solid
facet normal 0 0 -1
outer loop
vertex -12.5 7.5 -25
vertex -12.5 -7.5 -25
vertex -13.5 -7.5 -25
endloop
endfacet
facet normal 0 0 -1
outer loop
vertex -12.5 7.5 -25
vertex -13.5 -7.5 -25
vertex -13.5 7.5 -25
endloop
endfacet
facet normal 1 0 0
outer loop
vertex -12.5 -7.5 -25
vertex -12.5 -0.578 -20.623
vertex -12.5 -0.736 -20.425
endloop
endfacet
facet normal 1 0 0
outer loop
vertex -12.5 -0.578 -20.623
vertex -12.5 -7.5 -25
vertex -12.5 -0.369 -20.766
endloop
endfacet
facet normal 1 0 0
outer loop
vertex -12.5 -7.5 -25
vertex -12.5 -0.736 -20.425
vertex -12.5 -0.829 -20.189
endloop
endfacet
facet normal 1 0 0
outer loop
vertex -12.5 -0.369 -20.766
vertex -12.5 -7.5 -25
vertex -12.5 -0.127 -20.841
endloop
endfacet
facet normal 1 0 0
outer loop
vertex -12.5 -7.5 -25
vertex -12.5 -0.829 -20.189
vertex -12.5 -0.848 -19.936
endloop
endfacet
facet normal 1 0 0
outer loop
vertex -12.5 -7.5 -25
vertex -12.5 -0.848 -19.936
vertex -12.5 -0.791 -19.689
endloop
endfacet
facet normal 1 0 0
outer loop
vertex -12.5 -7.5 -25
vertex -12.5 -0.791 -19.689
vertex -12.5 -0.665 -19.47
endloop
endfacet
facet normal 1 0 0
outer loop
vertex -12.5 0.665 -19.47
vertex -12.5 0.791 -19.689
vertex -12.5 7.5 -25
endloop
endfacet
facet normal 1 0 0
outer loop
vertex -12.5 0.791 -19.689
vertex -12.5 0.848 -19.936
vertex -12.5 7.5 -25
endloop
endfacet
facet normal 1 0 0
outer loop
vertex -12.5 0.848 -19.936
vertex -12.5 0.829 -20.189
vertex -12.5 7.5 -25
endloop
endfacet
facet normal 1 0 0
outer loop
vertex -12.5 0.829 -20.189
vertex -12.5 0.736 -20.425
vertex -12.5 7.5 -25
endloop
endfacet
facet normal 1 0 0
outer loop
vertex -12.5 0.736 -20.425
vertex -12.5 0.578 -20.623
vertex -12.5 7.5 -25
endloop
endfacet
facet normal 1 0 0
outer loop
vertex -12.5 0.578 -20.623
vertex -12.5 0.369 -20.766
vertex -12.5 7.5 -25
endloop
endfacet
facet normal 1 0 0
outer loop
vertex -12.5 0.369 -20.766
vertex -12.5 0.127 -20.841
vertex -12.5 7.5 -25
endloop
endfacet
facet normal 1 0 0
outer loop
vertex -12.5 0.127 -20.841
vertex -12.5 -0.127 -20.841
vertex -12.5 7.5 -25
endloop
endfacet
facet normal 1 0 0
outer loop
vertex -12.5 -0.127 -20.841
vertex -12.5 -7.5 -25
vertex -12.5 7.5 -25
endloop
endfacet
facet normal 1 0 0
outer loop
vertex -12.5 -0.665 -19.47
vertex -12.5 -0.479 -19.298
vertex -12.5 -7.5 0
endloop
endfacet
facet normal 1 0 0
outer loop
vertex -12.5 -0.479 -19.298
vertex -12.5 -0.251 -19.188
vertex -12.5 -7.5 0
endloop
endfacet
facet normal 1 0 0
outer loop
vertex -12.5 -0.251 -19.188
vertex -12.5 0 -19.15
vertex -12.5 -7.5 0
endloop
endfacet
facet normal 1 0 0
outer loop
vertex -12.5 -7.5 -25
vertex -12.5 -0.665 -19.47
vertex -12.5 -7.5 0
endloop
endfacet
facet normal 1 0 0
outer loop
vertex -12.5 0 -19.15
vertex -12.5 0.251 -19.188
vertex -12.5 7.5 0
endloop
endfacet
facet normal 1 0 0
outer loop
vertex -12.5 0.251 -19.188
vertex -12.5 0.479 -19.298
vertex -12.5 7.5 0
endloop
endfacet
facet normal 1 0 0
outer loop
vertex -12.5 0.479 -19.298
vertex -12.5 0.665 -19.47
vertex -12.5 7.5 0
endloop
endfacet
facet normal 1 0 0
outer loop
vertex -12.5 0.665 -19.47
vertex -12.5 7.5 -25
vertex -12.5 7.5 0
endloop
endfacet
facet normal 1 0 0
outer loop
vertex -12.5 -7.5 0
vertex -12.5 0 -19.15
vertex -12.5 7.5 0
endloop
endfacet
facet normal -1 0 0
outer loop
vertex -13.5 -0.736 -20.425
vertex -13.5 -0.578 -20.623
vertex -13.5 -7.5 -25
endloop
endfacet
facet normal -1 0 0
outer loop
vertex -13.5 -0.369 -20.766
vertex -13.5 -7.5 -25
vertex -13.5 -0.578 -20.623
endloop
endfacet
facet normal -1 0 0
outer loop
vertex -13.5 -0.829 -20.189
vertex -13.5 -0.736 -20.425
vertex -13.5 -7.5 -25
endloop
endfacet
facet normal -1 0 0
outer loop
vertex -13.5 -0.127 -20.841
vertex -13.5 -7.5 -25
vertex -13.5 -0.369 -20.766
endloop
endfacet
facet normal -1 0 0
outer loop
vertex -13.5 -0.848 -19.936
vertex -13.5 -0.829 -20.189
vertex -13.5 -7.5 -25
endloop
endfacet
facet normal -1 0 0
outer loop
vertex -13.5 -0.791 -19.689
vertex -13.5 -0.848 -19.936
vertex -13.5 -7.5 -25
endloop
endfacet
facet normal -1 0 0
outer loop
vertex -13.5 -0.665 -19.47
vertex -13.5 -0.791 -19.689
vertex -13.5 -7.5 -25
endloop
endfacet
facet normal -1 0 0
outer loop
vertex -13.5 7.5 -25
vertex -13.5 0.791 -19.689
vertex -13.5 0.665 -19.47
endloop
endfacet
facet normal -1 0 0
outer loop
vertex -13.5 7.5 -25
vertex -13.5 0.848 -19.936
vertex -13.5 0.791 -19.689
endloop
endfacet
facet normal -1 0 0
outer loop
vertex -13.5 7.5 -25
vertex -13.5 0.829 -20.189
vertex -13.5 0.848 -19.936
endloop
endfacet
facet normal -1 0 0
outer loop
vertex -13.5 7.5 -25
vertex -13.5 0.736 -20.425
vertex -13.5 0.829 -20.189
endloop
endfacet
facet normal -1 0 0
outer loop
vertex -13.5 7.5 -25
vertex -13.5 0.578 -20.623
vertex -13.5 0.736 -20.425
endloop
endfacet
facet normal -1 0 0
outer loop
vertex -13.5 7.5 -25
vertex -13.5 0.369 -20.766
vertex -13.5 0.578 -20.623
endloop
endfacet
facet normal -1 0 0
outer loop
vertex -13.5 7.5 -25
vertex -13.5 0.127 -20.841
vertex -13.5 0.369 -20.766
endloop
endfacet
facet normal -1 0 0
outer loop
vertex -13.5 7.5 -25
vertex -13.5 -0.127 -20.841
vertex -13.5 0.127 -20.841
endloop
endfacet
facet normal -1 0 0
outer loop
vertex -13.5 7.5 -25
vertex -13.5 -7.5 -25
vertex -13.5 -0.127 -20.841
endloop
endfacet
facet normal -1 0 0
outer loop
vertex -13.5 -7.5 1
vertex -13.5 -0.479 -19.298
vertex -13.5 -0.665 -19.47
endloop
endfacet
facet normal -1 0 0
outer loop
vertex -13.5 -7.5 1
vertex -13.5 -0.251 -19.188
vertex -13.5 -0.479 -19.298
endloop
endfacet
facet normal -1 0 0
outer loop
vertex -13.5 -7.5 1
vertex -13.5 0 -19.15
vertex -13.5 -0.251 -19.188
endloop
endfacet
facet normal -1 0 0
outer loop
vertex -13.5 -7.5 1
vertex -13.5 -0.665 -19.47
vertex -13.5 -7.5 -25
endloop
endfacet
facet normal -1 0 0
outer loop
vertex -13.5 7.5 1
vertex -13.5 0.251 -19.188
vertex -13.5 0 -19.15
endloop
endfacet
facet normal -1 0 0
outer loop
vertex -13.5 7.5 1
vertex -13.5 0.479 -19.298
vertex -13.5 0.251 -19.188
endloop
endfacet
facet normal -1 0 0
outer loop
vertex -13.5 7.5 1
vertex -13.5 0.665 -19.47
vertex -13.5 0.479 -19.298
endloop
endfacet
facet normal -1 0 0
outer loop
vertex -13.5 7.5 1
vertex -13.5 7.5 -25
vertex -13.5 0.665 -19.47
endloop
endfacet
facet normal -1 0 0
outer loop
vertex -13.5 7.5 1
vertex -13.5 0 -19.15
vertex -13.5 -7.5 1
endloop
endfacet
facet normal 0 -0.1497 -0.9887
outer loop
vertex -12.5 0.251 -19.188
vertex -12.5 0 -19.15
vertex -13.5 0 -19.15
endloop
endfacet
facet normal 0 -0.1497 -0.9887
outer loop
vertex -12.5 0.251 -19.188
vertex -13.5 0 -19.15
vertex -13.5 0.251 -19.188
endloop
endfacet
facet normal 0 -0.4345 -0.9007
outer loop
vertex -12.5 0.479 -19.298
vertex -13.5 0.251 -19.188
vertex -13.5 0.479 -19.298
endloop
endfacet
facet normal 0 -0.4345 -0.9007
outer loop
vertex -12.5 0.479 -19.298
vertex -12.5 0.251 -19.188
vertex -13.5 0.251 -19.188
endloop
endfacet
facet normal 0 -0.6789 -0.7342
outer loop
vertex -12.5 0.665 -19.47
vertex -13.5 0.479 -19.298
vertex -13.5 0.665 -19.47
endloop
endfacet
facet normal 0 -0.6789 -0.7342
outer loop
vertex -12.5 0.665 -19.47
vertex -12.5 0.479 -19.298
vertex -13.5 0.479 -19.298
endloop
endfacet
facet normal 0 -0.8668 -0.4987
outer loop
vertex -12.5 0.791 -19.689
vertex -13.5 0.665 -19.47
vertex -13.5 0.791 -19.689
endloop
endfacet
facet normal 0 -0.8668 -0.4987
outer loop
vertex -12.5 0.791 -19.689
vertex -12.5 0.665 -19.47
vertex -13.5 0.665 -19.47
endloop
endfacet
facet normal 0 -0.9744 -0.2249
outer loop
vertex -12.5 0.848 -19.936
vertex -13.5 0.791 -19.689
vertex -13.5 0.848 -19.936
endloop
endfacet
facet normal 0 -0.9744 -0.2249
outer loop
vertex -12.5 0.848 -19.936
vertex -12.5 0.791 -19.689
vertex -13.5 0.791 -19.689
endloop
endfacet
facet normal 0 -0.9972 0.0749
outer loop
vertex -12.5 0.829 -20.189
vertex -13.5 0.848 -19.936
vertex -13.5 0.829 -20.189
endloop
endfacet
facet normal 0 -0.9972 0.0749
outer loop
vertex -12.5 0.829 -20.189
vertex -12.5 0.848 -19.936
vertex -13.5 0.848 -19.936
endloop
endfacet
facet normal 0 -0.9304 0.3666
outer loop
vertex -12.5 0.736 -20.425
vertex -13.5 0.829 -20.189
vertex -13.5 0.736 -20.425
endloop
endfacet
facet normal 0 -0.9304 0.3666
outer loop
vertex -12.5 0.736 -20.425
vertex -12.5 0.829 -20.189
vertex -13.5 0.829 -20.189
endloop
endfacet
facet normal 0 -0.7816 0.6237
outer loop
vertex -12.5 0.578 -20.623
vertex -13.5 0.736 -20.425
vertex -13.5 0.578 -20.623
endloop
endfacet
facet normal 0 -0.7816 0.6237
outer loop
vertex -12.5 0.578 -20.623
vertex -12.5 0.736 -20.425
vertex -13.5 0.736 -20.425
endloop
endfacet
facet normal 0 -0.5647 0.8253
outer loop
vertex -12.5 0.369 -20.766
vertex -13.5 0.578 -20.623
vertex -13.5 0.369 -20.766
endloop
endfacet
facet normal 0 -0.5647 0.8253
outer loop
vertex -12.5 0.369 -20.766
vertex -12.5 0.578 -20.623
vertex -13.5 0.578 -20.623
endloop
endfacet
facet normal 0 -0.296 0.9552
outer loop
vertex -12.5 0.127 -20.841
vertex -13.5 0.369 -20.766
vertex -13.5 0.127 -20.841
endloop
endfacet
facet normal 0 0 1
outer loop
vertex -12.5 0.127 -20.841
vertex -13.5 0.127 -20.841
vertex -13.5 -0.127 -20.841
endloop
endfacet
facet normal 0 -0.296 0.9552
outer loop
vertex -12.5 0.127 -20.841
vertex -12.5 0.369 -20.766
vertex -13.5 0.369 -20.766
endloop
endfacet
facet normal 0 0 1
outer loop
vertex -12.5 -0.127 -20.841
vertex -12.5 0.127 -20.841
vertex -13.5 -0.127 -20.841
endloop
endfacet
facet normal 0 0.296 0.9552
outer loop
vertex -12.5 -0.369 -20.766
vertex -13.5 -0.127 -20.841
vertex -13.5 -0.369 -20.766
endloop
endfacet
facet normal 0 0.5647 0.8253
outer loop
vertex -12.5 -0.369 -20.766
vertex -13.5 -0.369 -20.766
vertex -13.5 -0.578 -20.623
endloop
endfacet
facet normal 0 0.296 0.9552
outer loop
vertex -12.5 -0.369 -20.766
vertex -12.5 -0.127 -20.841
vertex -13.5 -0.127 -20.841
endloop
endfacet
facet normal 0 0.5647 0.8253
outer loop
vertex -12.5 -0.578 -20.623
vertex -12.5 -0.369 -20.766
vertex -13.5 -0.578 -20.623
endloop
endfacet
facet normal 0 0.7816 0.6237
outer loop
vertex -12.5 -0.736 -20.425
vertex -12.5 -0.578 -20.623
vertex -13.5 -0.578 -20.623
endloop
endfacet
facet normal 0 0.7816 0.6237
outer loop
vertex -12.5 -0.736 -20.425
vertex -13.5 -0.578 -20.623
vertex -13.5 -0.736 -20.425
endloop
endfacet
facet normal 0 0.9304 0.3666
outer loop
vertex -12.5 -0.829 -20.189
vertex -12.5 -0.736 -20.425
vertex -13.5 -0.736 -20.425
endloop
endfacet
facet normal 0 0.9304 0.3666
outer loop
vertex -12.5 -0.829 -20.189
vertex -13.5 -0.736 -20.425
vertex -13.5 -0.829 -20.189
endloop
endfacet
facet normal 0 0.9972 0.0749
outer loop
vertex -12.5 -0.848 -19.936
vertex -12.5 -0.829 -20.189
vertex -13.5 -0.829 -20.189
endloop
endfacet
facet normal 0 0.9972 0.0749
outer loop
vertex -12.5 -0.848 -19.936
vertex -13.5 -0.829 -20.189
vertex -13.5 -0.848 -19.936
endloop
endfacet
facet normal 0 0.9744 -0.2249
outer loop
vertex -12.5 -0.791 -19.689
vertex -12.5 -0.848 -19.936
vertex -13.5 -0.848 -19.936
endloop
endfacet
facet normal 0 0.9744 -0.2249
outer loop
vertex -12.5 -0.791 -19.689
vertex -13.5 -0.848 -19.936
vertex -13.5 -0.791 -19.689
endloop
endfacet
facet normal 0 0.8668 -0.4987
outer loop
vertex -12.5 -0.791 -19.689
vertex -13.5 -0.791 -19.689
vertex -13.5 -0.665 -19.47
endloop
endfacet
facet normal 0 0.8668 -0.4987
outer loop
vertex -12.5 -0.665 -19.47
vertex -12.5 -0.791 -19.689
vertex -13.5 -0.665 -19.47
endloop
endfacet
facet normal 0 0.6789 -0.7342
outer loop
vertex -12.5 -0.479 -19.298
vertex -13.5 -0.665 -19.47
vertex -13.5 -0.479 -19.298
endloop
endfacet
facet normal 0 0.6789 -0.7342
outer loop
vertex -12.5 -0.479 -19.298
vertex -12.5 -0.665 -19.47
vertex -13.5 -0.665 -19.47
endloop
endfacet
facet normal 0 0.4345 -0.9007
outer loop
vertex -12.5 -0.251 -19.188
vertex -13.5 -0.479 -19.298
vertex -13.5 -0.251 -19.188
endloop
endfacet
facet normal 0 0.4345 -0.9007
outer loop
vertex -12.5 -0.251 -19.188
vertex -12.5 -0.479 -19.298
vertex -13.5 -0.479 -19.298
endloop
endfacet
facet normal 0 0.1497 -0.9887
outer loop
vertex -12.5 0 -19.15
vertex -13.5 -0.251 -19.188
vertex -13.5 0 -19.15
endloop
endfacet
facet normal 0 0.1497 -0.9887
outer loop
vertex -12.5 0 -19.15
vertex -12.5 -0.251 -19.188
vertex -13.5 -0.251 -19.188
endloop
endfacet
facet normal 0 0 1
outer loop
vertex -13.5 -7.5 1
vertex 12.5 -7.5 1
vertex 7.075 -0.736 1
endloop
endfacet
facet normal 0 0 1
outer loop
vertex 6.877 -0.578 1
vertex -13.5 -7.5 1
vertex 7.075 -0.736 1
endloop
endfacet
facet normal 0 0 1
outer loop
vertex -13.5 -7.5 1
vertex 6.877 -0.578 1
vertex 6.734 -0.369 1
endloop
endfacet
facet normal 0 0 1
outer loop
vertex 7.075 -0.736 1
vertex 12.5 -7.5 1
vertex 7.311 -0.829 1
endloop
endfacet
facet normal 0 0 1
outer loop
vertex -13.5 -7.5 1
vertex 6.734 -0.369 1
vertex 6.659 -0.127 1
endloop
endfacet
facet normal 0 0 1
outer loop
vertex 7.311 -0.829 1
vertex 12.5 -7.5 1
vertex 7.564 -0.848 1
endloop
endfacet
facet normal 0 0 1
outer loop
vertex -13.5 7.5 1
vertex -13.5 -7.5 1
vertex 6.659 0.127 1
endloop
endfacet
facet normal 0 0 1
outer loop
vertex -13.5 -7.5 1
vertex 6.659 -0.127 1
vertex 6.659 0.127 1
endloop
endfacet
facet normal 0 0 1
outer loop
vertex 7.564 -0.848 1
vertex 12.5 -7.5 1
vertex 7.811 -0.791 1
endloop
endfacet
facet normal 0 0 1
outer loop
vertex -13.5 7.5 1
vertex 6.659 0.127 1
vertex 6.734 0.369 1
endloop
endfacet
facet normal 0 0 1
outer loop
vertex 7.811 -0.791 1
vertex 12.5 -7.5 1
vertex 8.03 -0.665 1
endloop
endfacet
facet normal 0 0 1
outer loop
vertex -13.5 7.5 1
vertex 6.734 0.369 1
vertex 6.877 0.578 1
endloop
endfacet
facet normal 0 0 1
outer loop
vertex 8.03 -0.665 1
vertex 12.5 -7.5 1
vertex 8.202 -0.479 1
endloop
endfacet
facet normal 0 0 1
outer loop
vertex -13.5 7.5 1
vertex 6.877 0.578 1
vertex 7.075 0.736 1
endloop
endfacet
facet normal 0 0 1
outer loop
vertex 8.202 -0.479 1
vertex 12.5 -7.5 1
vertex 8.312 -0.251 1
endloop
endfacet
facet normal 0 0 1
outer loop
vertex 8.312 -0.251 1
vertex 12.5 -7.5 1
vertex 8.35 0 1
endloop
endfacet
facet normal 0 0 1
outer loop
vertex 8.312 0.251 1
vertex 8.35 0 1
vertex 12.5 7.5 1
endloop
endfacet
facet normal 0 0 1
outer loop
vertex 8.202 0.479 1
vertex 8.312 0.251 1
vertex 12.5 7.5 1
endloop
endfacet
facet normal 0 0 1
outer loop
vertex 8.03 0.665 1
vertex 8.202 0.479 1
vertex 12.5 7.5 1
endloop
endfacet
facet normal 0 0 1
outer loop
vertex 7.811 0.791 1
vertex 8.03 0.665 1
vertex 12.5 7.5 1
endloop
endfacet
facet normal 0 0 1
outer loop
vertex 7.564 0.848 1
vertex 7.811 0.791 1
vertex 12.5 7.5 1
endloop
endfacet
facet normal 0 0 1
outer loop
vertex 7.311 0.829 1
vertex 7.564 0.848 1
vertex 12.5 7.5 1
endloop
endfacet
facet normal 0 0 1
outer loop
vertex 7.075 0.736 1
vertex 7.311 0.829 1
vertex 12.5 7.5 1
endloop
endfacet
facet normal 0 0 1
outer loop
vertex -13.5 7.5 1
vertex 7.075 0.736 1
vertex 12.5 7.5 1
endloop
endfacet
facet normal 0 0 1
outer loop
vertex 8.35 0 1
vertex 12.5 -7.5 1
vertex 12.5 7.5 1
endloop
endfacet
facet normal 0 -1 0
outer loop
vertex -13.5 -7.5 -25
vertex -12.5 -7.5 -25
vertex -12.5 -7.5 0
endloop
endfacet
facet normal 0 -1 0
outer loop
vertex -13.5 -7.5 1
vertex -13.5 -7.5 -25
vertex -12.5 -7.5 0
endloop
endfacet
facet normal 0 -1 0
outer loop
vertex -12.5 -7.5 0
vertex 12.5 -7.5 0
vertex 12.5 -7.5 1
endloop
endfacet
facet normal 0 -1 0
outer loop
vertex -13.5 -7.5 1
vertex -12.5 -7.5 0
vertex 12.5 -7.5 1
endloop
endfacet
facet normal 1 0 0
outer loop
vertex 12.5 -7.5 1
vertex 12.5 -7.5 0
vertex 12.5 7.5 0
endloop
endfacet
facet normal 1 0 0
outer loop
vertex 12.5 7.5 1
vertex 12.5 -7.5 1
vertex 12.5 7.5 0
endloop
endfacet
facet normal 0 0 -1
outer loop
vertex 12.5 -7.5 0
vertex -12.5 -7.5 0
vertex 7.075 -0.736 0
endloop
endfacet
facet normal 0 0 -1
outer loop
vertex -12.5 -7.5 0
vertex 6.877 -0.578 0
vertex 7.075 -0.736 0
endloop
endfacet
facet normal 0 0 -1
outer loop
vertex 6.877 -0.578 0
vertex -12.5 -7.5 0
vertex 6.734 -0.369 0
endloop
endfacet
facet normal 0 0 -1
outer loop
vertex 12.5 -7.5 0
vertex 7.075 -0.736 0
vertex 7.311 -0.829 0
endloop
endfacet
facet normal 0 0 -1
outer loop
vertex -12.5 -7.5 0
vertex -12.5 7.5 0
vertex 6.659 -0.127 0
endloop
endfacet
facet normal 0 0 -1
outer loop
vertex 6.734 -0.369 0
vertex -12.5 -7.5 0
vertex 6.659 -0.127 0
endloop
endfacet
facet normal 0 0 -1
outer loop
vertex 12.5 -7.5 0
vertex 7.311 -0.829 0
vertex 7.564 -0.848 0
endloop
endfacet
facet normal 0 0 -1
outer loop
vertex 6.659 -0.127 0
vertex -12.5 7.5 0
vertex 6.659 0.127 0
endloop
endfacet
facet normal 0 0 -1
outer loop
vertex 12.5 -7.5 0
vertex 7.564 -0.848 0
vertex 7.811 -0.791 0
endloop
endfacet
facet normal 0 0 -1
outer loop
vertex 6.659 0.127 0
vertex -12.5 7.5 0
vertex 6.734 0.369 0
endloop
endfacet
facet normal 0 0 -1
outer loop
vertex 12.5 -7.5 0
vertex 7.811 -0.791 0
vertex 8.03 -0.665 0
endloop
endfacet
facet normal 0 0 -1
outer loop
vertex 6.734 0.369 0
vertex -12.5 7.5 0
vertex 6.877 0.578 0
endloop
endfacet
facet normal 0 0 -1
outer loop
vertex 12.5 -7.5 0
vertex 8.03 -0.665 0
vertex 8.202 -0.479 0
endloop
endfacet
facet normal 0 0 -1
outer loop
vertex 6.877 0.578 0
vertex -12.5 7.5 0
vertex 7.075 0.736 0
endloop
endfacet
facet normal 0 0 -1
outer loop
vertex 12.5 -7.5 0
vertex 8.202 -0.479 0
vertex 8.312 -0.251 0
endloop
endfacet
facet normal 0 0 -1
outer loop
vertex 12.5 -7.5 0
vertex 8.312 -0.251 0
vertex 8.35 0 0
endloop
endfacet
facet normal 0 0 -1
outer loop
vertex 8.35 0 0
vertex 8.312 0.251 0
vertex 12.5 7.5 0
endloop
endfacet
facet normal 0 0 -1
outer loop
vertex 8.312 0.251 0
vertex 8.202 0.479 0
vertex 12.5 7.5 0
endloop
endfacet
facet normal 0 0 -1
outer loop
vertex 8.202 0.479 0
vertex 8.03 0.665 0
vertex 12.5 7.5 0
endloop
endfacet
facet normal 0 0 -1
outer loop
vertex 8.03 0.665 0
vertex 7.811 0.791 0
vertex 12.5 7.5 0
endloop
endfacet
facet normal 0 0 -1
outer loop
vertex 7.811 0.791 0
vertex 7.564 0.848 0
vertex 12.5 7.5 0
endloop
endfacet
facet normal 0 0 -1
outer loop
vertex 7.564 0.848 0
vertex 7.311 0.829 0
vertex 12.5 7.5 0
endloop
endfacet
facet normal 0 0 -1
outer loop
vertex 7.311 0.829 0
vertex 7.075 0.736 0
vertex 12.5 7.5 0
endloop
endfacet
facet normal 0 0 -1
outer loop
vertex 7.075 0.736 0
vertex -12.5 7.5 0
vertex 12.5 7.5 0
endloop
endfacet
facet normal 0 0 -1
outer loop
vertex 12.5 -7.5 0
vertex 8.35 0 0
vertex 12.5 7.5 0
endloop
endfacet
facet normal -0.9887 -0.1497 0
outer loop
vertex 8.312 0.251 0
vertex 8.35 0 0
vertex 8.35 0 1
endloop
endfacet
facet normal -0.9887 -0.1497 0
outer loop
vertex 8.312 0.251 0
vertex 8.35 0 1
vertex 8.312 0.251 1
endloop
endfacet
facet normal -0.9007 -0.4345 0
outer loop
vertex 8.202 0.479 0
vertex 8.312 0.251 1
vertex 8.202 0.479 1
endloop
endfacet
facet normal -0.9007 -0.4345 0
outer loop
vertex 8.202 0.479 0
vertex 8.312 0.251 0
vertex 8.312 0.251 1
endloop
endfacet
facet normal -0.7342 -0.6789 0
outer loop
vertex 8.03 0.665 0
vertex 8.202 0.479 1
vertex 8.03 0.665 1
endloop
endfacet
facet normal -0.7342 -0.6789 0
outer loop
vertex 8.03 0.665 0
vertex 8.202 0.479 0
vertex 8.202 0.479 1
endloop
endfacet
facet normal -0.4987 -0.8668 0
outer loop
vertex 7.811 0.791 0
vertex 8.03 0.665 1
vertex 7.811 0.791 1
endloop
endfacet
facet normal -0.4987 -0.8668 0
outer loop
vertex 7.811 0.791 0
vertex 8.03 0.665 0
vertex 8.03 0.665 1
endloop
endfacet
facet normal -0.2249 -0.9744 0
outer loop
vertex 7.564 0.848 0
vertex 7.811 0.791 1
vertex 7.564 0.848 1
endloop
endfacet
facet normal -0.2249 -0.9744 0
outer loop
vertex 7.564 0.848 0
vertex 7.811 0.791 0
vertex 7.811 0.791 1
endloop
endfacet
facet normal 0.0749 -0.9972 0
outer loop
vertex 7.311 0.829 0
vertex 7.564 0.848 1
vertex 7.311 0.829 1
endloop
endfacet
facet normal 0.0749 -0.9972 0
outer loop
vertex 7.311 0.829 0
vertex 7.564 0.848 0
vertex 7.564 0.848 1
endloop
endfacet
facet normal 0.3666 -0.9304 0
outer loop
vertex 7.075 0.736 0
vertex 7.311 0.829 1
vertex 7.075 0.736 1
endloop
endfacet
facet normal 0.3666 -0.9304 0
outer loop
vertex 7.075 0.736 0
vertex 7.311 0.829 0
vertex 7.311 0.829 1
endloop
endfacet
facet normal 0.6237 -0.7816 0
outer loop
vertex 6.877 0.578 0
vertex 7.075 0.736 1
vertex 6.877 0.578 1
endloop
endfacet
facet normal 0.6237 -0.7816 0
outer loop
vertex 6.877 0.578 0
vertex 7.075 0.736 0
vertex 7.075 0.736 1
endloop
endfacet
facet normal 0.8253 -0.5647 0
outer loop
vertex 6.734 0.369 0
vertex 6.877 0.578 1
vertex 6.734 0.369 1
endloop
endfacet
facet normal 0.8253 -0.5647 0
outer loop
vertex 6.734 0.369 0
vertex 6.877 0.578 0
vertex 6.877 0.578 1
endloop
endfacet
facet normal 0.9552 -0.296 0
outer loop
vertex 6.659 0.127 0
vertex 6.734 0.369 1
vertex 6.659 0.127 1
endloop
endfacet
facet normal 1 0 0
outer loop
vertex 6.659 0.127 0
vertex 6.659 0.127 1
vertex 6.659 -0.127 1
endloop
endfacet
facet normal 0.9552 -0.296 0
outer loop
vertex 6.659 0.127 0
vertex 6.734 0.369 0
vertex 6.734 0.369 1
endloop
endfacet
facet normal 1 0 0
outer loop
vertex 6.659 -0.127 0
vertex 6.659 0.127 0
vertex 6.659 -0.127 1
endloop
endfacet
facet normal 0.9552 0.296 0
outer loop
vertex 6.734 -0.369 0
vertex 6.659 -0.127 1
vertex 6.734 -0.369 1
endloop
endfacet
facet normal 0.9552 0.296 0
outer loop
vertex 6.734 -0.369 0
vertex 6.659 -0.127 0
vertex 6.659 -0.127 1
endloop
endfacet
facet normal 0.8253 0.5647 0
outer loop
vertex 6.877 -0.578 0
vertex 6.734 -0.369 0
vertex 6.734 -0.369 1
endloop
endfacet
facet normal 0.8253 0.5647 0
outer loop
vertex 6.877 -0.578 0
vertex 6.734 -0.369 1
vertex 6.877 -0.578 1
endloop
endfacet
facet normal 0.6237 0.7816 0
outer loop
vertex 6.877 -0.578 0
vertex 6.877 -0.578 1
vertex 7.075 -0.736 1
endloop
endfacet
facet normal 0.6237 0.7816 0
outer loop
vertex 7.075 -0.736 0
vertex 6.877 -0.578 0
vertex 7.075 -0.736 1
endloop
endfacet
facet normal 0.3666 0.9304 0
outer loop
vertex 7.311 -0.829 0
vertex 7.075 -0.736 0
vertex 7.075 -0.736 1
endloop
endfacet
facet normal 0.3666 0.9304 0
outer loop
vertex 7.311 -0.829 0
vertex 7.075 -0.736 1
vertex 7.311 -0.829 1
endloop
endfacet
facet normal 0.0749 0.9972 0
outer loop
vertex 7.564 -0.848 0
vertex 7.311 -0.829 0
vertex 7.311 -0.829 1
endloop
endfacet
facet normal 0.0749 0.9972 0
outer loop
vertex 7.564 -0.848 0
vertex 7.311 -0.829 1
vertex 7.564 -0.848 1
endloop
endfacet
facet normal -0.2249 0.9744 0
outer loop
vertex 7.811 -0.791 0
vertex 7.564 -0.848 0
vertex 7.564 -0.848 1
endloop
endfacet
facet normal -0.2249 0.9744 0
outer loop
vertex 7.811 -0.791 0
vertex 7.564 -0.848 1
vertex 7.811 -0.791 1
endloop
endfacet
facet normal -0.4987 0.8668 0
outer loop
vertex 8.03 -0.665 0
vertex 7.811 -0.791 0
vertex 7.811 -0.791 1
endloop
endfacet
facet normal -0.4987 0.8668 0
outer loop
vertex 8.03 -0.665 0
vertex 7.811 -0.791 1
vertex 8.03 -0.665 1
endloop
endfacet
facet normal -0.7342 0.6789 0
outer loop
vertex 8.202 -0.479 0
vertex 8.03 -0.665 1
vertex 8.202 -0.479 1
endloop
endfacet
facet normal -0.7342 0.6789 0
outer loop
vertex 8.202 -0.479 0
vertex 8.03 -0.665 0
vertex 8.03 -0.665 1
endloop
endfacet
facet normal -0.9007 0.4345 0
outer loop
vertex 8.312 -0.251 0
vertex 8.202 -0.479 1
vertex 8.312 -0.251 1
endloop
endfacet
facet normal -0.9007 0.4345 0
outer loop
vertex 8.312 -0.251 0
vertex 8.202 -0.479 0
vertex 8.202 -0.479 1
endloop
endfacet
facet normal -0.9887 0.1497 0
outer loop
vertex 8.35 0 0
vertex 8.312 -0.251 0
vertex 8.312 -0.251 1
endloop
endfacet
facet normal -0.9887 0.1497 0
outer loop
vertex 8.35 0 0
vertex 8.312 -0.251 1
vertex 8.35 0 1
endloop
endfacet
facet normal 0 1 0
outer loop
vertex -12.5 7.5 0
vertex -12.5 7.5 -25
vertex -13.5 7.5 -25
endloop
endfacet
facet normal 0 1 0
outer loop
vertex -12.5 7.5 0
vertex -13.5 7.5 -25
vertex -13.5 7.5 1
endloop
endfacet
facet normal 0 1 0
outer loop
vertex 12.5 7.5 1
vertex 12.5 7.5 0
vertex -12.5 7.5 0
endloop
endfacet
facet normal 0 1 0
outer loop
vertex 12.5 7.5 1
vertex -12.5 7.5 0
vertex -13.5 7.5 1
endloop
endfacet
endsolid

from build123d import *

# Parameters (mm, degrees)
SKETCH1_W           = 25
SKETCH1_H           = 15
SKETCH1_R           = 0.85
BOSS_EXTRUDE1_DEPTH = 1
SKETCH2_W           = 26
SKETCH2_H           = 15
SKETCH2_R           = 0.85
BOSS_EXTRUDE2_DEPTH = 1


with BuildPart() as part:
    # Sketch1 → Boss-Extrude1 (new body)
    with BuildSketch(Plane.XY):
        Rectangle(SKETCH1_W, SKETCH1_H)
        with Locations((7.5, 0)):
            Circle(SKETCH1_R, mode=Mode.SUBTRACT)
    extrude(amount=BOSS_EXTRUDE1_DEPTH)

    # Sketch2 → Boss-Extrude2 (add)
    with BuildSketch(Plane.ZY.offset(12.5)):
        with Locations((-12, 0)):
            Rectangle(SKETCH2_W, SKETCH2_H)
        with Locations((-20, 0)):
            Circle(SKETCH2_R, mode=Mode.SUBTRACT)
    extrude(amount=BOSS_EXTRUDE2_DEPTH)


solid = part.part
